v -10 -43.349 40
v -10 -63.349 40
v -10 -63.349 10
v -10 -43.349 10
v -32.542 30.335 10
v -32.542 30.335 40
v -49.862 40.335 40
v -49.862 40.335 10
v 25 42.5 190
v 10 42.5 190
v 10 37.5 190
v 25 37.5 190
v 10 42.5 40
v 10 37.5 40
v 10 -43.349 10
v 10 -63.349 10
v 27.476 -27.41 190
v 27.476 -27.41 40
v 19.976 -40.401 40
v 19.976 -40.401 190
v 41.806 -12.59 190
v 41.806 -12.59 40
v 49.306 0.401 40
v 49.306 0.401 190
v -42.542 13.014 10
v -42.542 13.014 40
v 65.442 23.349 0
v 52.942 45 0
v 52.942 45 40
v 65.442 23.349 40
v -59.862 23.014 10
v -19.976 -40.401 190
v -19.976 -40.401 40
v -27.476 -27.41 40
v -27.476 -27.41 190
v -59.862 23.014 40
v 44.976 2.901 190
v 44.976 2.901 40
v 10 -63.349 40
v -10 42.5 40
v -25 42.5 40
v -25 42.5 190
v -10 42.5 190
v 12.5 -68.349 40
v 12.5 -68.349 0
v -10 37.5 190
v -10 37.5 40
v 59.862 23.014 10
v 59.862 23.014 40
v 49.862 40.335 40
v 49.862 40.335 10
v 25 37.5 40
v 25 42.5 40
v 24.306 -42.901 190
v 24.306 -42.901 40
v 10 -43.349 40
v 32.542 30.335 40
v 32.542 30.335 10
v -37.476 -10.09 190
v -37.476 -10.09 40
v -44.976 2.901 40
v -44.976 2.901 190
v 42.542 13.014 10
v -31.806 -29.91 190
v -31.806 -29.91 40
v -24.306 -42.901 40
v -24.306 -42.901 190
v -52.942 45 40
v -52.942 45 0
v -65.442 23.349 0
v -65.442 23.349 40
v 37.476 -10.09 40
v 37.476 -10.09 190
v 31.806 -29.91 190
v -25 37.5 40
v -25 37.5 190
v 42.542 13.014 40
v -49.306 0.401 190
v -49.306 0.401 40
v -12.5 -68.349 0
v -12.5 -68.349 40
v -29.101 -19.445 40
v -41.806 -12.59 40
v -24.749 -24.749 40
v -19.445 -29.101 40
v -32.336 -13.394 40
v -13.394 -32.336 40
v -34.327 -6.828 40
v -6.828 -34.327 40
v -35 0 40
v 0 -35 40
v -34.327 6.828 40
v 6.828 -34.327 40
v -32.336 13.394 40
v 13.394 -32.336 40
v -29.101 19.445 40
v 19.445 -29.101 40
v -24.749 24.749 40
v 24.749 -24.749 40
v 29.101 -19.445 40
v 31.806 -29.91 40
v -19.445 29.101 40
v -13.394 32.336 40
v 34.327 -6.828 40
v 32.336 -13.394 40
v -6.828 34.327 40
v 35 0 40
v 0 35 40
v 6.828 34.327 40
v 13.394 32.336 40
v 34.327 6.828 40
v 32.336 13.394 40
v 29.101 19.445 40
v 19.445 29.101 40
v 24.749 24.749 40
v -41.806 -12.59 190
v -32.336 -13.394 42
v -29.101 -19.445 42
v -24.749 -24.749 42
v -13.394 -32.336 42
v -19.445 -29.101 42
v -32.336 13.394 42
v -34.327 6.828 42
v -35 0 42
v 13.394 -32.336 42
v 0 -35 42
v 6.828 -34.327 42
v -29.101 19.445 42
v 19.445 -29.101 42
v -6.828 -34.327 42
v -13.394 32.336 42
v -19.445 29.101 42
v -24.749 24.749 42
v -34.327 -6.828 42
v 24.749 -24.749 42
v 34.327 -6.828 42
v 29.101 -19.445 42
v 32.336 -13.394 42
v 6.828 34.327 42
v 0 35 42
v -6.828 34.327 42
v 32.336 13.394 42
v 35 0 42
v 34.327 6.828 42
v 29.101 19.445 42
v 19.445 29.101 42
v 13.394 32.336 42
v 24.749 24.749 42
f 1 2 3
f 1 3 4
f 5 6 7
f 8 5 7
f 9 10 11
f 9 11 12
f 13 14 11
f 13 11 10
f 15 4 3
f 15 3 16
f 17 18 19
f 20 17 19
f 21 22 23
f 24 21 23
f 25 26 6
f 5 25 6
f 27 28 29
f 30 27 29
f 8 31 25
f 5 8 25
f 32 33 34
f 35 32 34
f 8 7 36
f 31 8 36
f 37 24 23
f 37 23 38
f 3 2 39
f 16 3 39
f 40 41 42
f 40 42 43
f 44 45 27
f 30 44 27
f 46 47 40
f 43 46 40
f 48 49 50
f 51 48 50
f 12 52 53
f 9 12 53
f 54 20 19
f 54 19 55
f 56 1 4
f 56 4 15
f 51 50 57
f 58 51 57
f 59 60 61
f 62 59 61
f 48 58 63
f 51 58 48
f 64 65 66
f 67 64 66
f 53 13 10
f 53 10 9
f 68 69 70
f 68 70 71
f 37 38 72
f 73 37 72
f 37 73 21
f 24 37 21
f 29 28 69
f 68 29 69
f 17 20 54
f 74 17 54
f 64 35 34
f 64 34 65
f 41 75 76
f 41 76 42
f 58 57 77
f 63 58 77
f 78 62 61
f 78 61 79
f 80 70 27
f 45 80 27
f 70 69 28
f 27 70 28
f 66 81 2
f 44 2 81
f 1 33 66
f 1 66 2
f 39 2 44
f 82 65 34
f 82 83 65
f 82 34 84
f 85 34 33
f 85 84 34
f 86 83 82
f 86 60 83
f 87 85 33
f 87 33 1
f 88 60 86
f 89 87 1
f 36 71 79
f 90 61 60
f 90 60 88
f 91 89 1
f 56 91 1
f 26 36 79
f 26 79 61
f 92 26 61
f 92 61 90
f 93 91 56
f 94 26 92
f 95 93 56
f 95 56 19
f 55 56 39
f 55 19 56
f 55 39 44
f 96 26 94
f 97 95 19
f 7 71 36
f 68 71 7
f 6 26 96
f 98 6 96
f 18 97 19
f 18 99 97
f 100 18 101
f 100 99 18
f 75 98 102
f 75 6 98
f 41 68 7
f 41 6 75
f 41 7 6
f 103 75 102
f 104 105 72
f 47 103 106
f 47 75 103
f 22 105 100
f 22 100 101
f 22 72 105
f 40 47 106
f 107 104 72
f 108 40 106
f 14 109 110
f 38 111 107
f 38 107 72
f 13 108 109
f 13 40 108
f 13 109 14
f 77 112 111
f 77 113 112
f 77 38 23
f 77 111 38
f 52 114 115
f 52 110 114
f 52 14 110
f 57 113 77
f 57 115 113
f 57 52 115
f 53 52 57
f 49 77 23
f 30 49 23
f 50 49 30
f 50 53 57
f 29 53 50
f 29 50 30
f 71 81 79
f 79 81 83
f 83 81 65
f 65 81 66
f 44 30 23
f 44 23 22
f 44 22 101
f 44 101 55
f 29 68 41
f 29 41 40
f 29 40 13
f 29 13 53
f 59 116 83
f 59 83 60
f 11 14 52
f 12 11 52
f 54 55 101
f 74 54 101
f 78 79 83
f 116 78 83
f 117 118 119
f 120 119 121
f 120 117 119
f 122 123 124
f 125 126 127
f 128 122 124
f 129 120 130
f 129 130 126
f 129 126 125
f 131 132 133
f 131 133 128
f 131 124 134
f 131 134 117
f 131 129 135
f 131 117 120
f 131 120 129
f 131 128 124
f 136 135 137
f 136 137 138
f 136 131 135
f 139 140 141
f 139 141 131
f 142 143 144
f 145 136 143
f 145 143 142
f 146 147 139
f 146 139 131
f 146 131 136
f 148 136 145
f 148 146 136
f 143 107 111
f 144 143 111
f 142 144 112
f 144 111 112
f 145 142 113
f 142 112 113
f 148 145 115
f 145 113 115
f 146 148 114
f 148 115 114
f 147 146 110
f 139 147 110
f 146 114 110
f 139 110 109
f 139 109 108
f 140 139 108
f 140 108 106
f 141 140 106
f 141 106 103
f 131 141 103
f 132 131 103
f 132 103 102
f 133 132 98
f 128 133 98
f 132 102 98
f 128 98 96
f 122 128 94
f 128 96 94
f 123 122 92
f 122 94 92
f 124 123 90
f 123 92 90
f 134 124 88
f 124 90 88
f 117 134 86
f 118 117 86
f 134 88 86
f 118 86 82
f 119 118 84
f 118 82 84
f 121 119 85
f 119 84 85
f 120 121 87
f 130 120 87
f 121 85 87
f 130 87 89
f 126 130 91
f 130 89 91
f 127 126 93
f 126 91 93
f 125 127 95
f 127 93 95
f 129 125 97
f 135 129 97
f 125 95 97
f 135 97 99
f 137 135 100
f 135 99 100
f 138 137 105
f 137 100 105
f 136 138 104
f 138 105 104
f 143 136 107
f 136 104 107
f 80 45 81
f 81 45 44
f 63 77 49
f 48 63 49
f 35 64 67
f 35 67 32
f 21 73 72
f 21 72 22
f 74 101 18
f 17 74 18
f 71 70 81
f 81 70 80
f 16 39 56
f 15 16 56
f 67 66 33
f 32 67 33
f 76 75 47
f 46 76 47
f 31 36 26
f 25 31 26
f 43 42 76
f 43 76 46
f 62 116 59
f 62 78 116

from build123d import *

# Parameters (mm, degrees)
F1_DEPTH = 40
F2_SIZE  = 25
F3_W     = 20
F3_H     = 20
F4_DEPTH = 30
F5_W     = 15
F5_H     = 5
F6_DEPTH = 150
F7_R     = 35
F8_DEPTH = 2


with BuildPart() as f1:
    # F0 (on Top) → F1 (new body)
    with BuildSketch(Plane.XY):
        Polygon((-77.942286, 45), (0, -90), (77.942286, 45), align=None)
    extrude(amount=F1_DEPTH)

    # F2
    f2_edges = [f1.edges().sort_by_distance(p)[0] for p in [
        (0, -90, 20),
        (77.942286, 45, 20),
        (-77.942286, 45, 20),
    ]]
    chamfer(f2_edges, length=F2_SIZE)

    # F3 (on face) → F4 (cut)
    with BuildSketch(Plane.XY.offset(40)):
        with Locations((0, -53.349365)):
            Rectangle(F3_W, F3_H)
        Polygon((-59.862159, 23.014428), (-42.541651, 13.014428), (-32.541651, 30.334936), (-49.862159, 40.334936), align=None)
        Polygon((49.862159, 40.334936), (32.541651, 30.334936), (42.541651, 13.014428), (59.862159, 23.014428), align=None)
    extrude(amount=-F4_DEPTH, mode=Mode.SUBTRACT)

    # F5 (on face) → F6 (join)
    with BuildSketch(Plane.XY.offset(40)):
        with Locations((-17.5, 40)):
            Rectangle(F5_W, F5_H)
        with Locations((17.5, 40)):
            Rectangle(F5_W, F5_H)
        Polygon((41.80608, -12.589746), (49.30608, 0.400635), (44.975953, 2.900635), (37.475953, -10.089746), align=None)
        Polygon((31.80608, -29.910254), (27.475953, -27.410254), (19.975953, -40.400635), (24.30608, -42.900635), align=None)
        Polygon((-31.80608, -29.910254), (-24.30608, -42.900635), (-19.975953, -40.400635), (-27.475953, -27.410254), align=None)
        Polygon((-41.80608, -12.589746), (-37.475953, -10.089746), (-44.975953, 2.900635), (-49.30608, 0.400635), align=None)
    extrude(amount=F6_DEPTH)

    # F7 (on face) → F8 (join)
    with BuildSketch(Plane.XY.offset(40)):
        Circle(F7_R)
    extrude(amount=F8_DEPTH)


solid = f1.part
